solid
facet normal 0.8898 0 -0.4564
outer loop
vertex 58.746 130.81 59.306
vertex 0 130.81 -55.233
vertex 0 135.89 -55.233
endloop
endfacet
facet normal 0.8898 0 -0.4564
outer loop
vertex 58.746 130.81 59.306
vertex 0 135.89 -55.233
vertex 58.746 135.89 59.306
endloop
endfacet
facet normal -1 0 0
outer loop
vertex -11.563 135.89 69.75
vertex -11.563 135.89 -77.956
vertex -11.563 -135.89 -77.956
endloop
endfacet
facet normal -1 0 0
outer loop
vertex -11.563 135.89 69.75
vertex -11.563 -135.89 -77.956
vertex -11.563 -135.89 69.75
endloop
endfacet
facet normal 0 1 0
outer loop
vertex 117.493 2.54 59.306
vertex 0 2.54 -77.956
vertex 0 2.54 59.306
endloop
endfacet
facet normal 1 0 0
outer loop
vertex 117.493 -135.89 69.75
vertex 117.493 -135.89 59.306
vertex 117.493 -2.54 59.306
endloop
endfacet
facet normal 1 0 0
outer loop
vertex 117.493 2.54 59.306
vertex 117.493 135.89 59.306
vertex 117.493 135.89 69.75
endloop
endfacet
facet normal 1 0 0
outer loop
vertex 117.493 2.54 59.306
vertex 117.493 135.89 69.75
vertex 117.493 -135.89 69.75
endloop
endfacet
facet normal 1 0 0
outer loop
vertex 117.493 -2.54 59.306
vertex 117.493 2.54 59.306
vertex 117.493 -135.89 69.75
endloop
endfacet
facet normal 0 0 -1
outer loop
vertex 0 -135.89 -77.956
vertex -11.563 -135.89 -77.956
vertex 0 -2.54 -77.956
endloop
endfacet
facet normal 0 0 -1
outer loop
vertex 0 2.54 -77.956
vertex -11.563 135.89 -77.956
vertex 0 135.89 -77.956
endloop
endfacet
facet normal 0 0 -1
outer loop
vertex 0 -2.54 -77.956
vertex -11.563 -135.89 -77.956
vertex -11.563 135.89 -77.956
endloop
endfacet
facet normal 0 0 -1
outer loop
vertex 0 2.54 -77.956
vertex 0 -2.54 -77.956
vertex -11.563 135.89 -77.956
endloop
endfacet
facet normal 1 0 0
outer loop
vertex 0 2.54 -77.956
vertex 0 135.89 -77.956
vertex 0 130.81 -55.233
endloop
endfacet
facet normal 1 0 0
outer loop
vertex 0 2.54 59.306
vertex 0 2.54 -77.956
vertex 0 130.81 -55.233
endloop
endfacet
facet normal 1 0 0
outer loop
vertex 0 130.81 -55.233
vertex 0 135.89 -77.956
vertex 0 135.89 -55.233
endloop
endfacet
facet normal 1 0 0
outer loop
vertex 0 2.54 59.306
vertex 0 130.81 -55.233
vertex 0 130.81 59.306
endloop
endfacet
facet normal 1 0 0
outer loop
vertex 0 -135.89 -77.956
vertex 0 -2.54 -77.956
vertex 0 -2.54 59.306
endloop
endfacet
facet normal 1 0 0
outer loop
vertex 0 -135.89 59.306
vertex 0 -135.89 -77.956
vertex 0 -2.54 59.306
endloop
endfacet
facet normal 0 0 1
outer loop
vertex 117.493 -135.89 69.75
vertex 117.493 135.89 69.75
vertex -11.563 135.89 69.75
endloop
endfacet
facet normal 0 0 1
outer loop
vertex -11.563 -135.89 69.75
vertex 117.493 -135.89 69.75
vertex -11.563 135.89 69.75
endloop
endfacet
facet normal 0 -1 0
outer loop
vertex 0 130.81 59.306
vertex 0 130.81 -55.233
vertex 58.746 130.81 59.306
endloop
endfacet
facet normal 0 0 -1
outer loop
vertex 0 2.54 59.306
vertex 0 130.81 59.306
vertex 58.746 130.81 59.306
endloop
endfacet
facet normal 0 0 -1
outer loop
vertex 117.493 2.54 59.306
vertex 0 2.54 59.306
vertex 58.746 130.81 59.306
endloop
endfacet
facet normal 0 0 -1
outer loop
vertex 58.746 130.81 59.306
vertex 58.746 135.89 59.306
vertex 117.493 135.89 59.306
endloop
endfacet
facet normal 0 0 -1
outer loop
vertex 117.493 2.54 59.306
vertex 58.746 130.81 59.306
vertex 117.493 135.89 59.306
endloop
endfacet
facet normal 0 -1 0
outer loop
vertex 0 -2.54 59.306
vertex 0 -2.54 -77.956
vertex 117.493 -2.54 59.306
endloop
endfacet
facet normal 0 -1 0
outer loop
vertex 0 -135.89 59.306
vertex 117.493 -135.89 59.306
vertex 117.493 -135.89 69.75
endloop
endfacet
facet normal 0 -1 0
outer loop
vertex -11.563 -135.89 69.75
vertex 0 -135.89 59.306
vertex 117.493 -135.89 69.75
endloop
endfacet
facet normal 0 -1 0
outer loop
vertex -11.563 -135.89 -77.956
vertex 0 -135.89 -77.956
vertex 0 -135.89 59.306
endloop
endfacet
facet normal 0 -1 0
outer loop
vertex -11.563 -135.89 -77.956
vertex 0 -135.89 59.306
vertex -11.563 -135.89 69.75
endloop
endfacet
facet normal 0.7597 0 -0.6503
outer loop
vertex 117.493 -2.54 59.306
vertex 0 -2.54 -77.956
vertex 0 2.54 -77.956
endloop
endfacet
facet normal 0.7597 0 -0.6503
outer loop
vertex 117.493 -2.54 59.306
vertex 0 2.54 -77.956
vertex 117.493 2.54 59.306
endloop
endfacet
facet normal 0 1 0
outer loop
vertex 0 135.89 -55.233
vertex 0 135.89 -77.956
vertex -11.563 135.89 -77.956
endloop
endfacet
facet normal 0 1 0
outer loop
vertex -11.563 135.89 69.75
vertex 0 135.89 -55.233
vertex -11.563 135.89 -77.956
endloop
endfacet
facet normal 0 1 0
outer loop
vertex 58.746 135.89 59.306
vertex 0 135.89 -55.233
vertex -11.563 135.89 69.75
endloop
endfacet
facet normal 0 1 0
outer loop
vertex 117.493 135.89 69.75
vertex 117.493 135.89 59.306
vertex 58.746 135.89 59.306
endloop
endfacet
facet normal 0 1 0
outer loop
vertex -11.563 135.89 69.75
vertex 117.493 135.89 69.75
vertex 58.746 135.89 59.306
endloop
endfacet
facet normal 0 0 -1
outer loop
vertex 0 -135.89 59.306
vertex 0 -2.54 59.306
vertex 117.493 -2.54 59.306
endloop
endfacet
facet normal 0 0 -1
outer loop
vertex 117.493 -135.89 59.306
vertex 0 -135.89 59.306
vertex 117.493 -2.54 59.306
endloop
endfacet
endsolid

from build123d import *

# Parameters (mm, degrees)
BOSS_EXTRUDE2_DEPTH = 135.89
RIB18_REACH         = 308.18
SKETCH4_WALL_W      = 743.085279388
SKETCH4_WALL_H      = 5.08
RIB27_REACH         = 197.826
SKETCH6_WALL_W      = 574.331256006
SKETCH6_WALL_H      = 5.08


with BuildPart() as part:
    # Sketch1 → Boss-Extrude2 (new, symmetric)
    with BuildSketch(Plane(origin=(0, 0, 0), x_dir=(1, 0, 0), z_dir=(0, 1, 0))):
        Polygon((-11.562777715, 77.955501368), (0, 77.955501368), (0, -59.305859892), (117.492741296, -59.305859892), (117.492741296, -69.749659119), (-11.562777715, -69.749659119), (-11.562777715, -59.305859892), align=None)
    extrude(amount=BOSS_EXTRUDE2_DEPTH, both=True)

    # Sketch4 wall → Rib18 (add, up to next)
    with BuildSketch(Plane(origin=(29.373185324, 135.89, 2.036221127), x_dir=(0.456367573522, 0, 0.889791345113), z_dir=(0.889791345113, 0, -0.456367573522)), mode=Mode.PRIVATE) as rib18_sk1:
        with Locations((0, 2.54)):
            Rectangle(SKETCH4_WALL_W, SKETCH4_WALL_H)
    rib18_tool1 = extrude(rib18_sk1.sketch, amount=-RIB18_REACH, mode=Mode.PRIVATE) - part.part
    add(rib18_tool1.solids().sort_by_distance((29.373185324, 135.89, 2.036221127))[0])

    # Sketch6 wall → Rib27 (add, up to next)
    with BuildSketch(Plane(origin=(58.746370648, 0, -9.324820738), x_dir=(0.650281202153, 0, 0.759693594896), z_dir=(0.759693594896, 0, -0.650281202153)), mode=Mode.PRIVATE) as rib27_sk1:
        Rectangle(SKETCH6_WALL_W, SKETCH6_WALL_H)
    rib27_tool1 = extrude(rib27_sk1.sketch, amount=-RIB27_REACH, mode=Mode.PRIVATE) - part.part
    add(rib27_tool1.solids().sort_by_distance((58.746370648, 0, -9.324820738))[0])


solid = part.part
